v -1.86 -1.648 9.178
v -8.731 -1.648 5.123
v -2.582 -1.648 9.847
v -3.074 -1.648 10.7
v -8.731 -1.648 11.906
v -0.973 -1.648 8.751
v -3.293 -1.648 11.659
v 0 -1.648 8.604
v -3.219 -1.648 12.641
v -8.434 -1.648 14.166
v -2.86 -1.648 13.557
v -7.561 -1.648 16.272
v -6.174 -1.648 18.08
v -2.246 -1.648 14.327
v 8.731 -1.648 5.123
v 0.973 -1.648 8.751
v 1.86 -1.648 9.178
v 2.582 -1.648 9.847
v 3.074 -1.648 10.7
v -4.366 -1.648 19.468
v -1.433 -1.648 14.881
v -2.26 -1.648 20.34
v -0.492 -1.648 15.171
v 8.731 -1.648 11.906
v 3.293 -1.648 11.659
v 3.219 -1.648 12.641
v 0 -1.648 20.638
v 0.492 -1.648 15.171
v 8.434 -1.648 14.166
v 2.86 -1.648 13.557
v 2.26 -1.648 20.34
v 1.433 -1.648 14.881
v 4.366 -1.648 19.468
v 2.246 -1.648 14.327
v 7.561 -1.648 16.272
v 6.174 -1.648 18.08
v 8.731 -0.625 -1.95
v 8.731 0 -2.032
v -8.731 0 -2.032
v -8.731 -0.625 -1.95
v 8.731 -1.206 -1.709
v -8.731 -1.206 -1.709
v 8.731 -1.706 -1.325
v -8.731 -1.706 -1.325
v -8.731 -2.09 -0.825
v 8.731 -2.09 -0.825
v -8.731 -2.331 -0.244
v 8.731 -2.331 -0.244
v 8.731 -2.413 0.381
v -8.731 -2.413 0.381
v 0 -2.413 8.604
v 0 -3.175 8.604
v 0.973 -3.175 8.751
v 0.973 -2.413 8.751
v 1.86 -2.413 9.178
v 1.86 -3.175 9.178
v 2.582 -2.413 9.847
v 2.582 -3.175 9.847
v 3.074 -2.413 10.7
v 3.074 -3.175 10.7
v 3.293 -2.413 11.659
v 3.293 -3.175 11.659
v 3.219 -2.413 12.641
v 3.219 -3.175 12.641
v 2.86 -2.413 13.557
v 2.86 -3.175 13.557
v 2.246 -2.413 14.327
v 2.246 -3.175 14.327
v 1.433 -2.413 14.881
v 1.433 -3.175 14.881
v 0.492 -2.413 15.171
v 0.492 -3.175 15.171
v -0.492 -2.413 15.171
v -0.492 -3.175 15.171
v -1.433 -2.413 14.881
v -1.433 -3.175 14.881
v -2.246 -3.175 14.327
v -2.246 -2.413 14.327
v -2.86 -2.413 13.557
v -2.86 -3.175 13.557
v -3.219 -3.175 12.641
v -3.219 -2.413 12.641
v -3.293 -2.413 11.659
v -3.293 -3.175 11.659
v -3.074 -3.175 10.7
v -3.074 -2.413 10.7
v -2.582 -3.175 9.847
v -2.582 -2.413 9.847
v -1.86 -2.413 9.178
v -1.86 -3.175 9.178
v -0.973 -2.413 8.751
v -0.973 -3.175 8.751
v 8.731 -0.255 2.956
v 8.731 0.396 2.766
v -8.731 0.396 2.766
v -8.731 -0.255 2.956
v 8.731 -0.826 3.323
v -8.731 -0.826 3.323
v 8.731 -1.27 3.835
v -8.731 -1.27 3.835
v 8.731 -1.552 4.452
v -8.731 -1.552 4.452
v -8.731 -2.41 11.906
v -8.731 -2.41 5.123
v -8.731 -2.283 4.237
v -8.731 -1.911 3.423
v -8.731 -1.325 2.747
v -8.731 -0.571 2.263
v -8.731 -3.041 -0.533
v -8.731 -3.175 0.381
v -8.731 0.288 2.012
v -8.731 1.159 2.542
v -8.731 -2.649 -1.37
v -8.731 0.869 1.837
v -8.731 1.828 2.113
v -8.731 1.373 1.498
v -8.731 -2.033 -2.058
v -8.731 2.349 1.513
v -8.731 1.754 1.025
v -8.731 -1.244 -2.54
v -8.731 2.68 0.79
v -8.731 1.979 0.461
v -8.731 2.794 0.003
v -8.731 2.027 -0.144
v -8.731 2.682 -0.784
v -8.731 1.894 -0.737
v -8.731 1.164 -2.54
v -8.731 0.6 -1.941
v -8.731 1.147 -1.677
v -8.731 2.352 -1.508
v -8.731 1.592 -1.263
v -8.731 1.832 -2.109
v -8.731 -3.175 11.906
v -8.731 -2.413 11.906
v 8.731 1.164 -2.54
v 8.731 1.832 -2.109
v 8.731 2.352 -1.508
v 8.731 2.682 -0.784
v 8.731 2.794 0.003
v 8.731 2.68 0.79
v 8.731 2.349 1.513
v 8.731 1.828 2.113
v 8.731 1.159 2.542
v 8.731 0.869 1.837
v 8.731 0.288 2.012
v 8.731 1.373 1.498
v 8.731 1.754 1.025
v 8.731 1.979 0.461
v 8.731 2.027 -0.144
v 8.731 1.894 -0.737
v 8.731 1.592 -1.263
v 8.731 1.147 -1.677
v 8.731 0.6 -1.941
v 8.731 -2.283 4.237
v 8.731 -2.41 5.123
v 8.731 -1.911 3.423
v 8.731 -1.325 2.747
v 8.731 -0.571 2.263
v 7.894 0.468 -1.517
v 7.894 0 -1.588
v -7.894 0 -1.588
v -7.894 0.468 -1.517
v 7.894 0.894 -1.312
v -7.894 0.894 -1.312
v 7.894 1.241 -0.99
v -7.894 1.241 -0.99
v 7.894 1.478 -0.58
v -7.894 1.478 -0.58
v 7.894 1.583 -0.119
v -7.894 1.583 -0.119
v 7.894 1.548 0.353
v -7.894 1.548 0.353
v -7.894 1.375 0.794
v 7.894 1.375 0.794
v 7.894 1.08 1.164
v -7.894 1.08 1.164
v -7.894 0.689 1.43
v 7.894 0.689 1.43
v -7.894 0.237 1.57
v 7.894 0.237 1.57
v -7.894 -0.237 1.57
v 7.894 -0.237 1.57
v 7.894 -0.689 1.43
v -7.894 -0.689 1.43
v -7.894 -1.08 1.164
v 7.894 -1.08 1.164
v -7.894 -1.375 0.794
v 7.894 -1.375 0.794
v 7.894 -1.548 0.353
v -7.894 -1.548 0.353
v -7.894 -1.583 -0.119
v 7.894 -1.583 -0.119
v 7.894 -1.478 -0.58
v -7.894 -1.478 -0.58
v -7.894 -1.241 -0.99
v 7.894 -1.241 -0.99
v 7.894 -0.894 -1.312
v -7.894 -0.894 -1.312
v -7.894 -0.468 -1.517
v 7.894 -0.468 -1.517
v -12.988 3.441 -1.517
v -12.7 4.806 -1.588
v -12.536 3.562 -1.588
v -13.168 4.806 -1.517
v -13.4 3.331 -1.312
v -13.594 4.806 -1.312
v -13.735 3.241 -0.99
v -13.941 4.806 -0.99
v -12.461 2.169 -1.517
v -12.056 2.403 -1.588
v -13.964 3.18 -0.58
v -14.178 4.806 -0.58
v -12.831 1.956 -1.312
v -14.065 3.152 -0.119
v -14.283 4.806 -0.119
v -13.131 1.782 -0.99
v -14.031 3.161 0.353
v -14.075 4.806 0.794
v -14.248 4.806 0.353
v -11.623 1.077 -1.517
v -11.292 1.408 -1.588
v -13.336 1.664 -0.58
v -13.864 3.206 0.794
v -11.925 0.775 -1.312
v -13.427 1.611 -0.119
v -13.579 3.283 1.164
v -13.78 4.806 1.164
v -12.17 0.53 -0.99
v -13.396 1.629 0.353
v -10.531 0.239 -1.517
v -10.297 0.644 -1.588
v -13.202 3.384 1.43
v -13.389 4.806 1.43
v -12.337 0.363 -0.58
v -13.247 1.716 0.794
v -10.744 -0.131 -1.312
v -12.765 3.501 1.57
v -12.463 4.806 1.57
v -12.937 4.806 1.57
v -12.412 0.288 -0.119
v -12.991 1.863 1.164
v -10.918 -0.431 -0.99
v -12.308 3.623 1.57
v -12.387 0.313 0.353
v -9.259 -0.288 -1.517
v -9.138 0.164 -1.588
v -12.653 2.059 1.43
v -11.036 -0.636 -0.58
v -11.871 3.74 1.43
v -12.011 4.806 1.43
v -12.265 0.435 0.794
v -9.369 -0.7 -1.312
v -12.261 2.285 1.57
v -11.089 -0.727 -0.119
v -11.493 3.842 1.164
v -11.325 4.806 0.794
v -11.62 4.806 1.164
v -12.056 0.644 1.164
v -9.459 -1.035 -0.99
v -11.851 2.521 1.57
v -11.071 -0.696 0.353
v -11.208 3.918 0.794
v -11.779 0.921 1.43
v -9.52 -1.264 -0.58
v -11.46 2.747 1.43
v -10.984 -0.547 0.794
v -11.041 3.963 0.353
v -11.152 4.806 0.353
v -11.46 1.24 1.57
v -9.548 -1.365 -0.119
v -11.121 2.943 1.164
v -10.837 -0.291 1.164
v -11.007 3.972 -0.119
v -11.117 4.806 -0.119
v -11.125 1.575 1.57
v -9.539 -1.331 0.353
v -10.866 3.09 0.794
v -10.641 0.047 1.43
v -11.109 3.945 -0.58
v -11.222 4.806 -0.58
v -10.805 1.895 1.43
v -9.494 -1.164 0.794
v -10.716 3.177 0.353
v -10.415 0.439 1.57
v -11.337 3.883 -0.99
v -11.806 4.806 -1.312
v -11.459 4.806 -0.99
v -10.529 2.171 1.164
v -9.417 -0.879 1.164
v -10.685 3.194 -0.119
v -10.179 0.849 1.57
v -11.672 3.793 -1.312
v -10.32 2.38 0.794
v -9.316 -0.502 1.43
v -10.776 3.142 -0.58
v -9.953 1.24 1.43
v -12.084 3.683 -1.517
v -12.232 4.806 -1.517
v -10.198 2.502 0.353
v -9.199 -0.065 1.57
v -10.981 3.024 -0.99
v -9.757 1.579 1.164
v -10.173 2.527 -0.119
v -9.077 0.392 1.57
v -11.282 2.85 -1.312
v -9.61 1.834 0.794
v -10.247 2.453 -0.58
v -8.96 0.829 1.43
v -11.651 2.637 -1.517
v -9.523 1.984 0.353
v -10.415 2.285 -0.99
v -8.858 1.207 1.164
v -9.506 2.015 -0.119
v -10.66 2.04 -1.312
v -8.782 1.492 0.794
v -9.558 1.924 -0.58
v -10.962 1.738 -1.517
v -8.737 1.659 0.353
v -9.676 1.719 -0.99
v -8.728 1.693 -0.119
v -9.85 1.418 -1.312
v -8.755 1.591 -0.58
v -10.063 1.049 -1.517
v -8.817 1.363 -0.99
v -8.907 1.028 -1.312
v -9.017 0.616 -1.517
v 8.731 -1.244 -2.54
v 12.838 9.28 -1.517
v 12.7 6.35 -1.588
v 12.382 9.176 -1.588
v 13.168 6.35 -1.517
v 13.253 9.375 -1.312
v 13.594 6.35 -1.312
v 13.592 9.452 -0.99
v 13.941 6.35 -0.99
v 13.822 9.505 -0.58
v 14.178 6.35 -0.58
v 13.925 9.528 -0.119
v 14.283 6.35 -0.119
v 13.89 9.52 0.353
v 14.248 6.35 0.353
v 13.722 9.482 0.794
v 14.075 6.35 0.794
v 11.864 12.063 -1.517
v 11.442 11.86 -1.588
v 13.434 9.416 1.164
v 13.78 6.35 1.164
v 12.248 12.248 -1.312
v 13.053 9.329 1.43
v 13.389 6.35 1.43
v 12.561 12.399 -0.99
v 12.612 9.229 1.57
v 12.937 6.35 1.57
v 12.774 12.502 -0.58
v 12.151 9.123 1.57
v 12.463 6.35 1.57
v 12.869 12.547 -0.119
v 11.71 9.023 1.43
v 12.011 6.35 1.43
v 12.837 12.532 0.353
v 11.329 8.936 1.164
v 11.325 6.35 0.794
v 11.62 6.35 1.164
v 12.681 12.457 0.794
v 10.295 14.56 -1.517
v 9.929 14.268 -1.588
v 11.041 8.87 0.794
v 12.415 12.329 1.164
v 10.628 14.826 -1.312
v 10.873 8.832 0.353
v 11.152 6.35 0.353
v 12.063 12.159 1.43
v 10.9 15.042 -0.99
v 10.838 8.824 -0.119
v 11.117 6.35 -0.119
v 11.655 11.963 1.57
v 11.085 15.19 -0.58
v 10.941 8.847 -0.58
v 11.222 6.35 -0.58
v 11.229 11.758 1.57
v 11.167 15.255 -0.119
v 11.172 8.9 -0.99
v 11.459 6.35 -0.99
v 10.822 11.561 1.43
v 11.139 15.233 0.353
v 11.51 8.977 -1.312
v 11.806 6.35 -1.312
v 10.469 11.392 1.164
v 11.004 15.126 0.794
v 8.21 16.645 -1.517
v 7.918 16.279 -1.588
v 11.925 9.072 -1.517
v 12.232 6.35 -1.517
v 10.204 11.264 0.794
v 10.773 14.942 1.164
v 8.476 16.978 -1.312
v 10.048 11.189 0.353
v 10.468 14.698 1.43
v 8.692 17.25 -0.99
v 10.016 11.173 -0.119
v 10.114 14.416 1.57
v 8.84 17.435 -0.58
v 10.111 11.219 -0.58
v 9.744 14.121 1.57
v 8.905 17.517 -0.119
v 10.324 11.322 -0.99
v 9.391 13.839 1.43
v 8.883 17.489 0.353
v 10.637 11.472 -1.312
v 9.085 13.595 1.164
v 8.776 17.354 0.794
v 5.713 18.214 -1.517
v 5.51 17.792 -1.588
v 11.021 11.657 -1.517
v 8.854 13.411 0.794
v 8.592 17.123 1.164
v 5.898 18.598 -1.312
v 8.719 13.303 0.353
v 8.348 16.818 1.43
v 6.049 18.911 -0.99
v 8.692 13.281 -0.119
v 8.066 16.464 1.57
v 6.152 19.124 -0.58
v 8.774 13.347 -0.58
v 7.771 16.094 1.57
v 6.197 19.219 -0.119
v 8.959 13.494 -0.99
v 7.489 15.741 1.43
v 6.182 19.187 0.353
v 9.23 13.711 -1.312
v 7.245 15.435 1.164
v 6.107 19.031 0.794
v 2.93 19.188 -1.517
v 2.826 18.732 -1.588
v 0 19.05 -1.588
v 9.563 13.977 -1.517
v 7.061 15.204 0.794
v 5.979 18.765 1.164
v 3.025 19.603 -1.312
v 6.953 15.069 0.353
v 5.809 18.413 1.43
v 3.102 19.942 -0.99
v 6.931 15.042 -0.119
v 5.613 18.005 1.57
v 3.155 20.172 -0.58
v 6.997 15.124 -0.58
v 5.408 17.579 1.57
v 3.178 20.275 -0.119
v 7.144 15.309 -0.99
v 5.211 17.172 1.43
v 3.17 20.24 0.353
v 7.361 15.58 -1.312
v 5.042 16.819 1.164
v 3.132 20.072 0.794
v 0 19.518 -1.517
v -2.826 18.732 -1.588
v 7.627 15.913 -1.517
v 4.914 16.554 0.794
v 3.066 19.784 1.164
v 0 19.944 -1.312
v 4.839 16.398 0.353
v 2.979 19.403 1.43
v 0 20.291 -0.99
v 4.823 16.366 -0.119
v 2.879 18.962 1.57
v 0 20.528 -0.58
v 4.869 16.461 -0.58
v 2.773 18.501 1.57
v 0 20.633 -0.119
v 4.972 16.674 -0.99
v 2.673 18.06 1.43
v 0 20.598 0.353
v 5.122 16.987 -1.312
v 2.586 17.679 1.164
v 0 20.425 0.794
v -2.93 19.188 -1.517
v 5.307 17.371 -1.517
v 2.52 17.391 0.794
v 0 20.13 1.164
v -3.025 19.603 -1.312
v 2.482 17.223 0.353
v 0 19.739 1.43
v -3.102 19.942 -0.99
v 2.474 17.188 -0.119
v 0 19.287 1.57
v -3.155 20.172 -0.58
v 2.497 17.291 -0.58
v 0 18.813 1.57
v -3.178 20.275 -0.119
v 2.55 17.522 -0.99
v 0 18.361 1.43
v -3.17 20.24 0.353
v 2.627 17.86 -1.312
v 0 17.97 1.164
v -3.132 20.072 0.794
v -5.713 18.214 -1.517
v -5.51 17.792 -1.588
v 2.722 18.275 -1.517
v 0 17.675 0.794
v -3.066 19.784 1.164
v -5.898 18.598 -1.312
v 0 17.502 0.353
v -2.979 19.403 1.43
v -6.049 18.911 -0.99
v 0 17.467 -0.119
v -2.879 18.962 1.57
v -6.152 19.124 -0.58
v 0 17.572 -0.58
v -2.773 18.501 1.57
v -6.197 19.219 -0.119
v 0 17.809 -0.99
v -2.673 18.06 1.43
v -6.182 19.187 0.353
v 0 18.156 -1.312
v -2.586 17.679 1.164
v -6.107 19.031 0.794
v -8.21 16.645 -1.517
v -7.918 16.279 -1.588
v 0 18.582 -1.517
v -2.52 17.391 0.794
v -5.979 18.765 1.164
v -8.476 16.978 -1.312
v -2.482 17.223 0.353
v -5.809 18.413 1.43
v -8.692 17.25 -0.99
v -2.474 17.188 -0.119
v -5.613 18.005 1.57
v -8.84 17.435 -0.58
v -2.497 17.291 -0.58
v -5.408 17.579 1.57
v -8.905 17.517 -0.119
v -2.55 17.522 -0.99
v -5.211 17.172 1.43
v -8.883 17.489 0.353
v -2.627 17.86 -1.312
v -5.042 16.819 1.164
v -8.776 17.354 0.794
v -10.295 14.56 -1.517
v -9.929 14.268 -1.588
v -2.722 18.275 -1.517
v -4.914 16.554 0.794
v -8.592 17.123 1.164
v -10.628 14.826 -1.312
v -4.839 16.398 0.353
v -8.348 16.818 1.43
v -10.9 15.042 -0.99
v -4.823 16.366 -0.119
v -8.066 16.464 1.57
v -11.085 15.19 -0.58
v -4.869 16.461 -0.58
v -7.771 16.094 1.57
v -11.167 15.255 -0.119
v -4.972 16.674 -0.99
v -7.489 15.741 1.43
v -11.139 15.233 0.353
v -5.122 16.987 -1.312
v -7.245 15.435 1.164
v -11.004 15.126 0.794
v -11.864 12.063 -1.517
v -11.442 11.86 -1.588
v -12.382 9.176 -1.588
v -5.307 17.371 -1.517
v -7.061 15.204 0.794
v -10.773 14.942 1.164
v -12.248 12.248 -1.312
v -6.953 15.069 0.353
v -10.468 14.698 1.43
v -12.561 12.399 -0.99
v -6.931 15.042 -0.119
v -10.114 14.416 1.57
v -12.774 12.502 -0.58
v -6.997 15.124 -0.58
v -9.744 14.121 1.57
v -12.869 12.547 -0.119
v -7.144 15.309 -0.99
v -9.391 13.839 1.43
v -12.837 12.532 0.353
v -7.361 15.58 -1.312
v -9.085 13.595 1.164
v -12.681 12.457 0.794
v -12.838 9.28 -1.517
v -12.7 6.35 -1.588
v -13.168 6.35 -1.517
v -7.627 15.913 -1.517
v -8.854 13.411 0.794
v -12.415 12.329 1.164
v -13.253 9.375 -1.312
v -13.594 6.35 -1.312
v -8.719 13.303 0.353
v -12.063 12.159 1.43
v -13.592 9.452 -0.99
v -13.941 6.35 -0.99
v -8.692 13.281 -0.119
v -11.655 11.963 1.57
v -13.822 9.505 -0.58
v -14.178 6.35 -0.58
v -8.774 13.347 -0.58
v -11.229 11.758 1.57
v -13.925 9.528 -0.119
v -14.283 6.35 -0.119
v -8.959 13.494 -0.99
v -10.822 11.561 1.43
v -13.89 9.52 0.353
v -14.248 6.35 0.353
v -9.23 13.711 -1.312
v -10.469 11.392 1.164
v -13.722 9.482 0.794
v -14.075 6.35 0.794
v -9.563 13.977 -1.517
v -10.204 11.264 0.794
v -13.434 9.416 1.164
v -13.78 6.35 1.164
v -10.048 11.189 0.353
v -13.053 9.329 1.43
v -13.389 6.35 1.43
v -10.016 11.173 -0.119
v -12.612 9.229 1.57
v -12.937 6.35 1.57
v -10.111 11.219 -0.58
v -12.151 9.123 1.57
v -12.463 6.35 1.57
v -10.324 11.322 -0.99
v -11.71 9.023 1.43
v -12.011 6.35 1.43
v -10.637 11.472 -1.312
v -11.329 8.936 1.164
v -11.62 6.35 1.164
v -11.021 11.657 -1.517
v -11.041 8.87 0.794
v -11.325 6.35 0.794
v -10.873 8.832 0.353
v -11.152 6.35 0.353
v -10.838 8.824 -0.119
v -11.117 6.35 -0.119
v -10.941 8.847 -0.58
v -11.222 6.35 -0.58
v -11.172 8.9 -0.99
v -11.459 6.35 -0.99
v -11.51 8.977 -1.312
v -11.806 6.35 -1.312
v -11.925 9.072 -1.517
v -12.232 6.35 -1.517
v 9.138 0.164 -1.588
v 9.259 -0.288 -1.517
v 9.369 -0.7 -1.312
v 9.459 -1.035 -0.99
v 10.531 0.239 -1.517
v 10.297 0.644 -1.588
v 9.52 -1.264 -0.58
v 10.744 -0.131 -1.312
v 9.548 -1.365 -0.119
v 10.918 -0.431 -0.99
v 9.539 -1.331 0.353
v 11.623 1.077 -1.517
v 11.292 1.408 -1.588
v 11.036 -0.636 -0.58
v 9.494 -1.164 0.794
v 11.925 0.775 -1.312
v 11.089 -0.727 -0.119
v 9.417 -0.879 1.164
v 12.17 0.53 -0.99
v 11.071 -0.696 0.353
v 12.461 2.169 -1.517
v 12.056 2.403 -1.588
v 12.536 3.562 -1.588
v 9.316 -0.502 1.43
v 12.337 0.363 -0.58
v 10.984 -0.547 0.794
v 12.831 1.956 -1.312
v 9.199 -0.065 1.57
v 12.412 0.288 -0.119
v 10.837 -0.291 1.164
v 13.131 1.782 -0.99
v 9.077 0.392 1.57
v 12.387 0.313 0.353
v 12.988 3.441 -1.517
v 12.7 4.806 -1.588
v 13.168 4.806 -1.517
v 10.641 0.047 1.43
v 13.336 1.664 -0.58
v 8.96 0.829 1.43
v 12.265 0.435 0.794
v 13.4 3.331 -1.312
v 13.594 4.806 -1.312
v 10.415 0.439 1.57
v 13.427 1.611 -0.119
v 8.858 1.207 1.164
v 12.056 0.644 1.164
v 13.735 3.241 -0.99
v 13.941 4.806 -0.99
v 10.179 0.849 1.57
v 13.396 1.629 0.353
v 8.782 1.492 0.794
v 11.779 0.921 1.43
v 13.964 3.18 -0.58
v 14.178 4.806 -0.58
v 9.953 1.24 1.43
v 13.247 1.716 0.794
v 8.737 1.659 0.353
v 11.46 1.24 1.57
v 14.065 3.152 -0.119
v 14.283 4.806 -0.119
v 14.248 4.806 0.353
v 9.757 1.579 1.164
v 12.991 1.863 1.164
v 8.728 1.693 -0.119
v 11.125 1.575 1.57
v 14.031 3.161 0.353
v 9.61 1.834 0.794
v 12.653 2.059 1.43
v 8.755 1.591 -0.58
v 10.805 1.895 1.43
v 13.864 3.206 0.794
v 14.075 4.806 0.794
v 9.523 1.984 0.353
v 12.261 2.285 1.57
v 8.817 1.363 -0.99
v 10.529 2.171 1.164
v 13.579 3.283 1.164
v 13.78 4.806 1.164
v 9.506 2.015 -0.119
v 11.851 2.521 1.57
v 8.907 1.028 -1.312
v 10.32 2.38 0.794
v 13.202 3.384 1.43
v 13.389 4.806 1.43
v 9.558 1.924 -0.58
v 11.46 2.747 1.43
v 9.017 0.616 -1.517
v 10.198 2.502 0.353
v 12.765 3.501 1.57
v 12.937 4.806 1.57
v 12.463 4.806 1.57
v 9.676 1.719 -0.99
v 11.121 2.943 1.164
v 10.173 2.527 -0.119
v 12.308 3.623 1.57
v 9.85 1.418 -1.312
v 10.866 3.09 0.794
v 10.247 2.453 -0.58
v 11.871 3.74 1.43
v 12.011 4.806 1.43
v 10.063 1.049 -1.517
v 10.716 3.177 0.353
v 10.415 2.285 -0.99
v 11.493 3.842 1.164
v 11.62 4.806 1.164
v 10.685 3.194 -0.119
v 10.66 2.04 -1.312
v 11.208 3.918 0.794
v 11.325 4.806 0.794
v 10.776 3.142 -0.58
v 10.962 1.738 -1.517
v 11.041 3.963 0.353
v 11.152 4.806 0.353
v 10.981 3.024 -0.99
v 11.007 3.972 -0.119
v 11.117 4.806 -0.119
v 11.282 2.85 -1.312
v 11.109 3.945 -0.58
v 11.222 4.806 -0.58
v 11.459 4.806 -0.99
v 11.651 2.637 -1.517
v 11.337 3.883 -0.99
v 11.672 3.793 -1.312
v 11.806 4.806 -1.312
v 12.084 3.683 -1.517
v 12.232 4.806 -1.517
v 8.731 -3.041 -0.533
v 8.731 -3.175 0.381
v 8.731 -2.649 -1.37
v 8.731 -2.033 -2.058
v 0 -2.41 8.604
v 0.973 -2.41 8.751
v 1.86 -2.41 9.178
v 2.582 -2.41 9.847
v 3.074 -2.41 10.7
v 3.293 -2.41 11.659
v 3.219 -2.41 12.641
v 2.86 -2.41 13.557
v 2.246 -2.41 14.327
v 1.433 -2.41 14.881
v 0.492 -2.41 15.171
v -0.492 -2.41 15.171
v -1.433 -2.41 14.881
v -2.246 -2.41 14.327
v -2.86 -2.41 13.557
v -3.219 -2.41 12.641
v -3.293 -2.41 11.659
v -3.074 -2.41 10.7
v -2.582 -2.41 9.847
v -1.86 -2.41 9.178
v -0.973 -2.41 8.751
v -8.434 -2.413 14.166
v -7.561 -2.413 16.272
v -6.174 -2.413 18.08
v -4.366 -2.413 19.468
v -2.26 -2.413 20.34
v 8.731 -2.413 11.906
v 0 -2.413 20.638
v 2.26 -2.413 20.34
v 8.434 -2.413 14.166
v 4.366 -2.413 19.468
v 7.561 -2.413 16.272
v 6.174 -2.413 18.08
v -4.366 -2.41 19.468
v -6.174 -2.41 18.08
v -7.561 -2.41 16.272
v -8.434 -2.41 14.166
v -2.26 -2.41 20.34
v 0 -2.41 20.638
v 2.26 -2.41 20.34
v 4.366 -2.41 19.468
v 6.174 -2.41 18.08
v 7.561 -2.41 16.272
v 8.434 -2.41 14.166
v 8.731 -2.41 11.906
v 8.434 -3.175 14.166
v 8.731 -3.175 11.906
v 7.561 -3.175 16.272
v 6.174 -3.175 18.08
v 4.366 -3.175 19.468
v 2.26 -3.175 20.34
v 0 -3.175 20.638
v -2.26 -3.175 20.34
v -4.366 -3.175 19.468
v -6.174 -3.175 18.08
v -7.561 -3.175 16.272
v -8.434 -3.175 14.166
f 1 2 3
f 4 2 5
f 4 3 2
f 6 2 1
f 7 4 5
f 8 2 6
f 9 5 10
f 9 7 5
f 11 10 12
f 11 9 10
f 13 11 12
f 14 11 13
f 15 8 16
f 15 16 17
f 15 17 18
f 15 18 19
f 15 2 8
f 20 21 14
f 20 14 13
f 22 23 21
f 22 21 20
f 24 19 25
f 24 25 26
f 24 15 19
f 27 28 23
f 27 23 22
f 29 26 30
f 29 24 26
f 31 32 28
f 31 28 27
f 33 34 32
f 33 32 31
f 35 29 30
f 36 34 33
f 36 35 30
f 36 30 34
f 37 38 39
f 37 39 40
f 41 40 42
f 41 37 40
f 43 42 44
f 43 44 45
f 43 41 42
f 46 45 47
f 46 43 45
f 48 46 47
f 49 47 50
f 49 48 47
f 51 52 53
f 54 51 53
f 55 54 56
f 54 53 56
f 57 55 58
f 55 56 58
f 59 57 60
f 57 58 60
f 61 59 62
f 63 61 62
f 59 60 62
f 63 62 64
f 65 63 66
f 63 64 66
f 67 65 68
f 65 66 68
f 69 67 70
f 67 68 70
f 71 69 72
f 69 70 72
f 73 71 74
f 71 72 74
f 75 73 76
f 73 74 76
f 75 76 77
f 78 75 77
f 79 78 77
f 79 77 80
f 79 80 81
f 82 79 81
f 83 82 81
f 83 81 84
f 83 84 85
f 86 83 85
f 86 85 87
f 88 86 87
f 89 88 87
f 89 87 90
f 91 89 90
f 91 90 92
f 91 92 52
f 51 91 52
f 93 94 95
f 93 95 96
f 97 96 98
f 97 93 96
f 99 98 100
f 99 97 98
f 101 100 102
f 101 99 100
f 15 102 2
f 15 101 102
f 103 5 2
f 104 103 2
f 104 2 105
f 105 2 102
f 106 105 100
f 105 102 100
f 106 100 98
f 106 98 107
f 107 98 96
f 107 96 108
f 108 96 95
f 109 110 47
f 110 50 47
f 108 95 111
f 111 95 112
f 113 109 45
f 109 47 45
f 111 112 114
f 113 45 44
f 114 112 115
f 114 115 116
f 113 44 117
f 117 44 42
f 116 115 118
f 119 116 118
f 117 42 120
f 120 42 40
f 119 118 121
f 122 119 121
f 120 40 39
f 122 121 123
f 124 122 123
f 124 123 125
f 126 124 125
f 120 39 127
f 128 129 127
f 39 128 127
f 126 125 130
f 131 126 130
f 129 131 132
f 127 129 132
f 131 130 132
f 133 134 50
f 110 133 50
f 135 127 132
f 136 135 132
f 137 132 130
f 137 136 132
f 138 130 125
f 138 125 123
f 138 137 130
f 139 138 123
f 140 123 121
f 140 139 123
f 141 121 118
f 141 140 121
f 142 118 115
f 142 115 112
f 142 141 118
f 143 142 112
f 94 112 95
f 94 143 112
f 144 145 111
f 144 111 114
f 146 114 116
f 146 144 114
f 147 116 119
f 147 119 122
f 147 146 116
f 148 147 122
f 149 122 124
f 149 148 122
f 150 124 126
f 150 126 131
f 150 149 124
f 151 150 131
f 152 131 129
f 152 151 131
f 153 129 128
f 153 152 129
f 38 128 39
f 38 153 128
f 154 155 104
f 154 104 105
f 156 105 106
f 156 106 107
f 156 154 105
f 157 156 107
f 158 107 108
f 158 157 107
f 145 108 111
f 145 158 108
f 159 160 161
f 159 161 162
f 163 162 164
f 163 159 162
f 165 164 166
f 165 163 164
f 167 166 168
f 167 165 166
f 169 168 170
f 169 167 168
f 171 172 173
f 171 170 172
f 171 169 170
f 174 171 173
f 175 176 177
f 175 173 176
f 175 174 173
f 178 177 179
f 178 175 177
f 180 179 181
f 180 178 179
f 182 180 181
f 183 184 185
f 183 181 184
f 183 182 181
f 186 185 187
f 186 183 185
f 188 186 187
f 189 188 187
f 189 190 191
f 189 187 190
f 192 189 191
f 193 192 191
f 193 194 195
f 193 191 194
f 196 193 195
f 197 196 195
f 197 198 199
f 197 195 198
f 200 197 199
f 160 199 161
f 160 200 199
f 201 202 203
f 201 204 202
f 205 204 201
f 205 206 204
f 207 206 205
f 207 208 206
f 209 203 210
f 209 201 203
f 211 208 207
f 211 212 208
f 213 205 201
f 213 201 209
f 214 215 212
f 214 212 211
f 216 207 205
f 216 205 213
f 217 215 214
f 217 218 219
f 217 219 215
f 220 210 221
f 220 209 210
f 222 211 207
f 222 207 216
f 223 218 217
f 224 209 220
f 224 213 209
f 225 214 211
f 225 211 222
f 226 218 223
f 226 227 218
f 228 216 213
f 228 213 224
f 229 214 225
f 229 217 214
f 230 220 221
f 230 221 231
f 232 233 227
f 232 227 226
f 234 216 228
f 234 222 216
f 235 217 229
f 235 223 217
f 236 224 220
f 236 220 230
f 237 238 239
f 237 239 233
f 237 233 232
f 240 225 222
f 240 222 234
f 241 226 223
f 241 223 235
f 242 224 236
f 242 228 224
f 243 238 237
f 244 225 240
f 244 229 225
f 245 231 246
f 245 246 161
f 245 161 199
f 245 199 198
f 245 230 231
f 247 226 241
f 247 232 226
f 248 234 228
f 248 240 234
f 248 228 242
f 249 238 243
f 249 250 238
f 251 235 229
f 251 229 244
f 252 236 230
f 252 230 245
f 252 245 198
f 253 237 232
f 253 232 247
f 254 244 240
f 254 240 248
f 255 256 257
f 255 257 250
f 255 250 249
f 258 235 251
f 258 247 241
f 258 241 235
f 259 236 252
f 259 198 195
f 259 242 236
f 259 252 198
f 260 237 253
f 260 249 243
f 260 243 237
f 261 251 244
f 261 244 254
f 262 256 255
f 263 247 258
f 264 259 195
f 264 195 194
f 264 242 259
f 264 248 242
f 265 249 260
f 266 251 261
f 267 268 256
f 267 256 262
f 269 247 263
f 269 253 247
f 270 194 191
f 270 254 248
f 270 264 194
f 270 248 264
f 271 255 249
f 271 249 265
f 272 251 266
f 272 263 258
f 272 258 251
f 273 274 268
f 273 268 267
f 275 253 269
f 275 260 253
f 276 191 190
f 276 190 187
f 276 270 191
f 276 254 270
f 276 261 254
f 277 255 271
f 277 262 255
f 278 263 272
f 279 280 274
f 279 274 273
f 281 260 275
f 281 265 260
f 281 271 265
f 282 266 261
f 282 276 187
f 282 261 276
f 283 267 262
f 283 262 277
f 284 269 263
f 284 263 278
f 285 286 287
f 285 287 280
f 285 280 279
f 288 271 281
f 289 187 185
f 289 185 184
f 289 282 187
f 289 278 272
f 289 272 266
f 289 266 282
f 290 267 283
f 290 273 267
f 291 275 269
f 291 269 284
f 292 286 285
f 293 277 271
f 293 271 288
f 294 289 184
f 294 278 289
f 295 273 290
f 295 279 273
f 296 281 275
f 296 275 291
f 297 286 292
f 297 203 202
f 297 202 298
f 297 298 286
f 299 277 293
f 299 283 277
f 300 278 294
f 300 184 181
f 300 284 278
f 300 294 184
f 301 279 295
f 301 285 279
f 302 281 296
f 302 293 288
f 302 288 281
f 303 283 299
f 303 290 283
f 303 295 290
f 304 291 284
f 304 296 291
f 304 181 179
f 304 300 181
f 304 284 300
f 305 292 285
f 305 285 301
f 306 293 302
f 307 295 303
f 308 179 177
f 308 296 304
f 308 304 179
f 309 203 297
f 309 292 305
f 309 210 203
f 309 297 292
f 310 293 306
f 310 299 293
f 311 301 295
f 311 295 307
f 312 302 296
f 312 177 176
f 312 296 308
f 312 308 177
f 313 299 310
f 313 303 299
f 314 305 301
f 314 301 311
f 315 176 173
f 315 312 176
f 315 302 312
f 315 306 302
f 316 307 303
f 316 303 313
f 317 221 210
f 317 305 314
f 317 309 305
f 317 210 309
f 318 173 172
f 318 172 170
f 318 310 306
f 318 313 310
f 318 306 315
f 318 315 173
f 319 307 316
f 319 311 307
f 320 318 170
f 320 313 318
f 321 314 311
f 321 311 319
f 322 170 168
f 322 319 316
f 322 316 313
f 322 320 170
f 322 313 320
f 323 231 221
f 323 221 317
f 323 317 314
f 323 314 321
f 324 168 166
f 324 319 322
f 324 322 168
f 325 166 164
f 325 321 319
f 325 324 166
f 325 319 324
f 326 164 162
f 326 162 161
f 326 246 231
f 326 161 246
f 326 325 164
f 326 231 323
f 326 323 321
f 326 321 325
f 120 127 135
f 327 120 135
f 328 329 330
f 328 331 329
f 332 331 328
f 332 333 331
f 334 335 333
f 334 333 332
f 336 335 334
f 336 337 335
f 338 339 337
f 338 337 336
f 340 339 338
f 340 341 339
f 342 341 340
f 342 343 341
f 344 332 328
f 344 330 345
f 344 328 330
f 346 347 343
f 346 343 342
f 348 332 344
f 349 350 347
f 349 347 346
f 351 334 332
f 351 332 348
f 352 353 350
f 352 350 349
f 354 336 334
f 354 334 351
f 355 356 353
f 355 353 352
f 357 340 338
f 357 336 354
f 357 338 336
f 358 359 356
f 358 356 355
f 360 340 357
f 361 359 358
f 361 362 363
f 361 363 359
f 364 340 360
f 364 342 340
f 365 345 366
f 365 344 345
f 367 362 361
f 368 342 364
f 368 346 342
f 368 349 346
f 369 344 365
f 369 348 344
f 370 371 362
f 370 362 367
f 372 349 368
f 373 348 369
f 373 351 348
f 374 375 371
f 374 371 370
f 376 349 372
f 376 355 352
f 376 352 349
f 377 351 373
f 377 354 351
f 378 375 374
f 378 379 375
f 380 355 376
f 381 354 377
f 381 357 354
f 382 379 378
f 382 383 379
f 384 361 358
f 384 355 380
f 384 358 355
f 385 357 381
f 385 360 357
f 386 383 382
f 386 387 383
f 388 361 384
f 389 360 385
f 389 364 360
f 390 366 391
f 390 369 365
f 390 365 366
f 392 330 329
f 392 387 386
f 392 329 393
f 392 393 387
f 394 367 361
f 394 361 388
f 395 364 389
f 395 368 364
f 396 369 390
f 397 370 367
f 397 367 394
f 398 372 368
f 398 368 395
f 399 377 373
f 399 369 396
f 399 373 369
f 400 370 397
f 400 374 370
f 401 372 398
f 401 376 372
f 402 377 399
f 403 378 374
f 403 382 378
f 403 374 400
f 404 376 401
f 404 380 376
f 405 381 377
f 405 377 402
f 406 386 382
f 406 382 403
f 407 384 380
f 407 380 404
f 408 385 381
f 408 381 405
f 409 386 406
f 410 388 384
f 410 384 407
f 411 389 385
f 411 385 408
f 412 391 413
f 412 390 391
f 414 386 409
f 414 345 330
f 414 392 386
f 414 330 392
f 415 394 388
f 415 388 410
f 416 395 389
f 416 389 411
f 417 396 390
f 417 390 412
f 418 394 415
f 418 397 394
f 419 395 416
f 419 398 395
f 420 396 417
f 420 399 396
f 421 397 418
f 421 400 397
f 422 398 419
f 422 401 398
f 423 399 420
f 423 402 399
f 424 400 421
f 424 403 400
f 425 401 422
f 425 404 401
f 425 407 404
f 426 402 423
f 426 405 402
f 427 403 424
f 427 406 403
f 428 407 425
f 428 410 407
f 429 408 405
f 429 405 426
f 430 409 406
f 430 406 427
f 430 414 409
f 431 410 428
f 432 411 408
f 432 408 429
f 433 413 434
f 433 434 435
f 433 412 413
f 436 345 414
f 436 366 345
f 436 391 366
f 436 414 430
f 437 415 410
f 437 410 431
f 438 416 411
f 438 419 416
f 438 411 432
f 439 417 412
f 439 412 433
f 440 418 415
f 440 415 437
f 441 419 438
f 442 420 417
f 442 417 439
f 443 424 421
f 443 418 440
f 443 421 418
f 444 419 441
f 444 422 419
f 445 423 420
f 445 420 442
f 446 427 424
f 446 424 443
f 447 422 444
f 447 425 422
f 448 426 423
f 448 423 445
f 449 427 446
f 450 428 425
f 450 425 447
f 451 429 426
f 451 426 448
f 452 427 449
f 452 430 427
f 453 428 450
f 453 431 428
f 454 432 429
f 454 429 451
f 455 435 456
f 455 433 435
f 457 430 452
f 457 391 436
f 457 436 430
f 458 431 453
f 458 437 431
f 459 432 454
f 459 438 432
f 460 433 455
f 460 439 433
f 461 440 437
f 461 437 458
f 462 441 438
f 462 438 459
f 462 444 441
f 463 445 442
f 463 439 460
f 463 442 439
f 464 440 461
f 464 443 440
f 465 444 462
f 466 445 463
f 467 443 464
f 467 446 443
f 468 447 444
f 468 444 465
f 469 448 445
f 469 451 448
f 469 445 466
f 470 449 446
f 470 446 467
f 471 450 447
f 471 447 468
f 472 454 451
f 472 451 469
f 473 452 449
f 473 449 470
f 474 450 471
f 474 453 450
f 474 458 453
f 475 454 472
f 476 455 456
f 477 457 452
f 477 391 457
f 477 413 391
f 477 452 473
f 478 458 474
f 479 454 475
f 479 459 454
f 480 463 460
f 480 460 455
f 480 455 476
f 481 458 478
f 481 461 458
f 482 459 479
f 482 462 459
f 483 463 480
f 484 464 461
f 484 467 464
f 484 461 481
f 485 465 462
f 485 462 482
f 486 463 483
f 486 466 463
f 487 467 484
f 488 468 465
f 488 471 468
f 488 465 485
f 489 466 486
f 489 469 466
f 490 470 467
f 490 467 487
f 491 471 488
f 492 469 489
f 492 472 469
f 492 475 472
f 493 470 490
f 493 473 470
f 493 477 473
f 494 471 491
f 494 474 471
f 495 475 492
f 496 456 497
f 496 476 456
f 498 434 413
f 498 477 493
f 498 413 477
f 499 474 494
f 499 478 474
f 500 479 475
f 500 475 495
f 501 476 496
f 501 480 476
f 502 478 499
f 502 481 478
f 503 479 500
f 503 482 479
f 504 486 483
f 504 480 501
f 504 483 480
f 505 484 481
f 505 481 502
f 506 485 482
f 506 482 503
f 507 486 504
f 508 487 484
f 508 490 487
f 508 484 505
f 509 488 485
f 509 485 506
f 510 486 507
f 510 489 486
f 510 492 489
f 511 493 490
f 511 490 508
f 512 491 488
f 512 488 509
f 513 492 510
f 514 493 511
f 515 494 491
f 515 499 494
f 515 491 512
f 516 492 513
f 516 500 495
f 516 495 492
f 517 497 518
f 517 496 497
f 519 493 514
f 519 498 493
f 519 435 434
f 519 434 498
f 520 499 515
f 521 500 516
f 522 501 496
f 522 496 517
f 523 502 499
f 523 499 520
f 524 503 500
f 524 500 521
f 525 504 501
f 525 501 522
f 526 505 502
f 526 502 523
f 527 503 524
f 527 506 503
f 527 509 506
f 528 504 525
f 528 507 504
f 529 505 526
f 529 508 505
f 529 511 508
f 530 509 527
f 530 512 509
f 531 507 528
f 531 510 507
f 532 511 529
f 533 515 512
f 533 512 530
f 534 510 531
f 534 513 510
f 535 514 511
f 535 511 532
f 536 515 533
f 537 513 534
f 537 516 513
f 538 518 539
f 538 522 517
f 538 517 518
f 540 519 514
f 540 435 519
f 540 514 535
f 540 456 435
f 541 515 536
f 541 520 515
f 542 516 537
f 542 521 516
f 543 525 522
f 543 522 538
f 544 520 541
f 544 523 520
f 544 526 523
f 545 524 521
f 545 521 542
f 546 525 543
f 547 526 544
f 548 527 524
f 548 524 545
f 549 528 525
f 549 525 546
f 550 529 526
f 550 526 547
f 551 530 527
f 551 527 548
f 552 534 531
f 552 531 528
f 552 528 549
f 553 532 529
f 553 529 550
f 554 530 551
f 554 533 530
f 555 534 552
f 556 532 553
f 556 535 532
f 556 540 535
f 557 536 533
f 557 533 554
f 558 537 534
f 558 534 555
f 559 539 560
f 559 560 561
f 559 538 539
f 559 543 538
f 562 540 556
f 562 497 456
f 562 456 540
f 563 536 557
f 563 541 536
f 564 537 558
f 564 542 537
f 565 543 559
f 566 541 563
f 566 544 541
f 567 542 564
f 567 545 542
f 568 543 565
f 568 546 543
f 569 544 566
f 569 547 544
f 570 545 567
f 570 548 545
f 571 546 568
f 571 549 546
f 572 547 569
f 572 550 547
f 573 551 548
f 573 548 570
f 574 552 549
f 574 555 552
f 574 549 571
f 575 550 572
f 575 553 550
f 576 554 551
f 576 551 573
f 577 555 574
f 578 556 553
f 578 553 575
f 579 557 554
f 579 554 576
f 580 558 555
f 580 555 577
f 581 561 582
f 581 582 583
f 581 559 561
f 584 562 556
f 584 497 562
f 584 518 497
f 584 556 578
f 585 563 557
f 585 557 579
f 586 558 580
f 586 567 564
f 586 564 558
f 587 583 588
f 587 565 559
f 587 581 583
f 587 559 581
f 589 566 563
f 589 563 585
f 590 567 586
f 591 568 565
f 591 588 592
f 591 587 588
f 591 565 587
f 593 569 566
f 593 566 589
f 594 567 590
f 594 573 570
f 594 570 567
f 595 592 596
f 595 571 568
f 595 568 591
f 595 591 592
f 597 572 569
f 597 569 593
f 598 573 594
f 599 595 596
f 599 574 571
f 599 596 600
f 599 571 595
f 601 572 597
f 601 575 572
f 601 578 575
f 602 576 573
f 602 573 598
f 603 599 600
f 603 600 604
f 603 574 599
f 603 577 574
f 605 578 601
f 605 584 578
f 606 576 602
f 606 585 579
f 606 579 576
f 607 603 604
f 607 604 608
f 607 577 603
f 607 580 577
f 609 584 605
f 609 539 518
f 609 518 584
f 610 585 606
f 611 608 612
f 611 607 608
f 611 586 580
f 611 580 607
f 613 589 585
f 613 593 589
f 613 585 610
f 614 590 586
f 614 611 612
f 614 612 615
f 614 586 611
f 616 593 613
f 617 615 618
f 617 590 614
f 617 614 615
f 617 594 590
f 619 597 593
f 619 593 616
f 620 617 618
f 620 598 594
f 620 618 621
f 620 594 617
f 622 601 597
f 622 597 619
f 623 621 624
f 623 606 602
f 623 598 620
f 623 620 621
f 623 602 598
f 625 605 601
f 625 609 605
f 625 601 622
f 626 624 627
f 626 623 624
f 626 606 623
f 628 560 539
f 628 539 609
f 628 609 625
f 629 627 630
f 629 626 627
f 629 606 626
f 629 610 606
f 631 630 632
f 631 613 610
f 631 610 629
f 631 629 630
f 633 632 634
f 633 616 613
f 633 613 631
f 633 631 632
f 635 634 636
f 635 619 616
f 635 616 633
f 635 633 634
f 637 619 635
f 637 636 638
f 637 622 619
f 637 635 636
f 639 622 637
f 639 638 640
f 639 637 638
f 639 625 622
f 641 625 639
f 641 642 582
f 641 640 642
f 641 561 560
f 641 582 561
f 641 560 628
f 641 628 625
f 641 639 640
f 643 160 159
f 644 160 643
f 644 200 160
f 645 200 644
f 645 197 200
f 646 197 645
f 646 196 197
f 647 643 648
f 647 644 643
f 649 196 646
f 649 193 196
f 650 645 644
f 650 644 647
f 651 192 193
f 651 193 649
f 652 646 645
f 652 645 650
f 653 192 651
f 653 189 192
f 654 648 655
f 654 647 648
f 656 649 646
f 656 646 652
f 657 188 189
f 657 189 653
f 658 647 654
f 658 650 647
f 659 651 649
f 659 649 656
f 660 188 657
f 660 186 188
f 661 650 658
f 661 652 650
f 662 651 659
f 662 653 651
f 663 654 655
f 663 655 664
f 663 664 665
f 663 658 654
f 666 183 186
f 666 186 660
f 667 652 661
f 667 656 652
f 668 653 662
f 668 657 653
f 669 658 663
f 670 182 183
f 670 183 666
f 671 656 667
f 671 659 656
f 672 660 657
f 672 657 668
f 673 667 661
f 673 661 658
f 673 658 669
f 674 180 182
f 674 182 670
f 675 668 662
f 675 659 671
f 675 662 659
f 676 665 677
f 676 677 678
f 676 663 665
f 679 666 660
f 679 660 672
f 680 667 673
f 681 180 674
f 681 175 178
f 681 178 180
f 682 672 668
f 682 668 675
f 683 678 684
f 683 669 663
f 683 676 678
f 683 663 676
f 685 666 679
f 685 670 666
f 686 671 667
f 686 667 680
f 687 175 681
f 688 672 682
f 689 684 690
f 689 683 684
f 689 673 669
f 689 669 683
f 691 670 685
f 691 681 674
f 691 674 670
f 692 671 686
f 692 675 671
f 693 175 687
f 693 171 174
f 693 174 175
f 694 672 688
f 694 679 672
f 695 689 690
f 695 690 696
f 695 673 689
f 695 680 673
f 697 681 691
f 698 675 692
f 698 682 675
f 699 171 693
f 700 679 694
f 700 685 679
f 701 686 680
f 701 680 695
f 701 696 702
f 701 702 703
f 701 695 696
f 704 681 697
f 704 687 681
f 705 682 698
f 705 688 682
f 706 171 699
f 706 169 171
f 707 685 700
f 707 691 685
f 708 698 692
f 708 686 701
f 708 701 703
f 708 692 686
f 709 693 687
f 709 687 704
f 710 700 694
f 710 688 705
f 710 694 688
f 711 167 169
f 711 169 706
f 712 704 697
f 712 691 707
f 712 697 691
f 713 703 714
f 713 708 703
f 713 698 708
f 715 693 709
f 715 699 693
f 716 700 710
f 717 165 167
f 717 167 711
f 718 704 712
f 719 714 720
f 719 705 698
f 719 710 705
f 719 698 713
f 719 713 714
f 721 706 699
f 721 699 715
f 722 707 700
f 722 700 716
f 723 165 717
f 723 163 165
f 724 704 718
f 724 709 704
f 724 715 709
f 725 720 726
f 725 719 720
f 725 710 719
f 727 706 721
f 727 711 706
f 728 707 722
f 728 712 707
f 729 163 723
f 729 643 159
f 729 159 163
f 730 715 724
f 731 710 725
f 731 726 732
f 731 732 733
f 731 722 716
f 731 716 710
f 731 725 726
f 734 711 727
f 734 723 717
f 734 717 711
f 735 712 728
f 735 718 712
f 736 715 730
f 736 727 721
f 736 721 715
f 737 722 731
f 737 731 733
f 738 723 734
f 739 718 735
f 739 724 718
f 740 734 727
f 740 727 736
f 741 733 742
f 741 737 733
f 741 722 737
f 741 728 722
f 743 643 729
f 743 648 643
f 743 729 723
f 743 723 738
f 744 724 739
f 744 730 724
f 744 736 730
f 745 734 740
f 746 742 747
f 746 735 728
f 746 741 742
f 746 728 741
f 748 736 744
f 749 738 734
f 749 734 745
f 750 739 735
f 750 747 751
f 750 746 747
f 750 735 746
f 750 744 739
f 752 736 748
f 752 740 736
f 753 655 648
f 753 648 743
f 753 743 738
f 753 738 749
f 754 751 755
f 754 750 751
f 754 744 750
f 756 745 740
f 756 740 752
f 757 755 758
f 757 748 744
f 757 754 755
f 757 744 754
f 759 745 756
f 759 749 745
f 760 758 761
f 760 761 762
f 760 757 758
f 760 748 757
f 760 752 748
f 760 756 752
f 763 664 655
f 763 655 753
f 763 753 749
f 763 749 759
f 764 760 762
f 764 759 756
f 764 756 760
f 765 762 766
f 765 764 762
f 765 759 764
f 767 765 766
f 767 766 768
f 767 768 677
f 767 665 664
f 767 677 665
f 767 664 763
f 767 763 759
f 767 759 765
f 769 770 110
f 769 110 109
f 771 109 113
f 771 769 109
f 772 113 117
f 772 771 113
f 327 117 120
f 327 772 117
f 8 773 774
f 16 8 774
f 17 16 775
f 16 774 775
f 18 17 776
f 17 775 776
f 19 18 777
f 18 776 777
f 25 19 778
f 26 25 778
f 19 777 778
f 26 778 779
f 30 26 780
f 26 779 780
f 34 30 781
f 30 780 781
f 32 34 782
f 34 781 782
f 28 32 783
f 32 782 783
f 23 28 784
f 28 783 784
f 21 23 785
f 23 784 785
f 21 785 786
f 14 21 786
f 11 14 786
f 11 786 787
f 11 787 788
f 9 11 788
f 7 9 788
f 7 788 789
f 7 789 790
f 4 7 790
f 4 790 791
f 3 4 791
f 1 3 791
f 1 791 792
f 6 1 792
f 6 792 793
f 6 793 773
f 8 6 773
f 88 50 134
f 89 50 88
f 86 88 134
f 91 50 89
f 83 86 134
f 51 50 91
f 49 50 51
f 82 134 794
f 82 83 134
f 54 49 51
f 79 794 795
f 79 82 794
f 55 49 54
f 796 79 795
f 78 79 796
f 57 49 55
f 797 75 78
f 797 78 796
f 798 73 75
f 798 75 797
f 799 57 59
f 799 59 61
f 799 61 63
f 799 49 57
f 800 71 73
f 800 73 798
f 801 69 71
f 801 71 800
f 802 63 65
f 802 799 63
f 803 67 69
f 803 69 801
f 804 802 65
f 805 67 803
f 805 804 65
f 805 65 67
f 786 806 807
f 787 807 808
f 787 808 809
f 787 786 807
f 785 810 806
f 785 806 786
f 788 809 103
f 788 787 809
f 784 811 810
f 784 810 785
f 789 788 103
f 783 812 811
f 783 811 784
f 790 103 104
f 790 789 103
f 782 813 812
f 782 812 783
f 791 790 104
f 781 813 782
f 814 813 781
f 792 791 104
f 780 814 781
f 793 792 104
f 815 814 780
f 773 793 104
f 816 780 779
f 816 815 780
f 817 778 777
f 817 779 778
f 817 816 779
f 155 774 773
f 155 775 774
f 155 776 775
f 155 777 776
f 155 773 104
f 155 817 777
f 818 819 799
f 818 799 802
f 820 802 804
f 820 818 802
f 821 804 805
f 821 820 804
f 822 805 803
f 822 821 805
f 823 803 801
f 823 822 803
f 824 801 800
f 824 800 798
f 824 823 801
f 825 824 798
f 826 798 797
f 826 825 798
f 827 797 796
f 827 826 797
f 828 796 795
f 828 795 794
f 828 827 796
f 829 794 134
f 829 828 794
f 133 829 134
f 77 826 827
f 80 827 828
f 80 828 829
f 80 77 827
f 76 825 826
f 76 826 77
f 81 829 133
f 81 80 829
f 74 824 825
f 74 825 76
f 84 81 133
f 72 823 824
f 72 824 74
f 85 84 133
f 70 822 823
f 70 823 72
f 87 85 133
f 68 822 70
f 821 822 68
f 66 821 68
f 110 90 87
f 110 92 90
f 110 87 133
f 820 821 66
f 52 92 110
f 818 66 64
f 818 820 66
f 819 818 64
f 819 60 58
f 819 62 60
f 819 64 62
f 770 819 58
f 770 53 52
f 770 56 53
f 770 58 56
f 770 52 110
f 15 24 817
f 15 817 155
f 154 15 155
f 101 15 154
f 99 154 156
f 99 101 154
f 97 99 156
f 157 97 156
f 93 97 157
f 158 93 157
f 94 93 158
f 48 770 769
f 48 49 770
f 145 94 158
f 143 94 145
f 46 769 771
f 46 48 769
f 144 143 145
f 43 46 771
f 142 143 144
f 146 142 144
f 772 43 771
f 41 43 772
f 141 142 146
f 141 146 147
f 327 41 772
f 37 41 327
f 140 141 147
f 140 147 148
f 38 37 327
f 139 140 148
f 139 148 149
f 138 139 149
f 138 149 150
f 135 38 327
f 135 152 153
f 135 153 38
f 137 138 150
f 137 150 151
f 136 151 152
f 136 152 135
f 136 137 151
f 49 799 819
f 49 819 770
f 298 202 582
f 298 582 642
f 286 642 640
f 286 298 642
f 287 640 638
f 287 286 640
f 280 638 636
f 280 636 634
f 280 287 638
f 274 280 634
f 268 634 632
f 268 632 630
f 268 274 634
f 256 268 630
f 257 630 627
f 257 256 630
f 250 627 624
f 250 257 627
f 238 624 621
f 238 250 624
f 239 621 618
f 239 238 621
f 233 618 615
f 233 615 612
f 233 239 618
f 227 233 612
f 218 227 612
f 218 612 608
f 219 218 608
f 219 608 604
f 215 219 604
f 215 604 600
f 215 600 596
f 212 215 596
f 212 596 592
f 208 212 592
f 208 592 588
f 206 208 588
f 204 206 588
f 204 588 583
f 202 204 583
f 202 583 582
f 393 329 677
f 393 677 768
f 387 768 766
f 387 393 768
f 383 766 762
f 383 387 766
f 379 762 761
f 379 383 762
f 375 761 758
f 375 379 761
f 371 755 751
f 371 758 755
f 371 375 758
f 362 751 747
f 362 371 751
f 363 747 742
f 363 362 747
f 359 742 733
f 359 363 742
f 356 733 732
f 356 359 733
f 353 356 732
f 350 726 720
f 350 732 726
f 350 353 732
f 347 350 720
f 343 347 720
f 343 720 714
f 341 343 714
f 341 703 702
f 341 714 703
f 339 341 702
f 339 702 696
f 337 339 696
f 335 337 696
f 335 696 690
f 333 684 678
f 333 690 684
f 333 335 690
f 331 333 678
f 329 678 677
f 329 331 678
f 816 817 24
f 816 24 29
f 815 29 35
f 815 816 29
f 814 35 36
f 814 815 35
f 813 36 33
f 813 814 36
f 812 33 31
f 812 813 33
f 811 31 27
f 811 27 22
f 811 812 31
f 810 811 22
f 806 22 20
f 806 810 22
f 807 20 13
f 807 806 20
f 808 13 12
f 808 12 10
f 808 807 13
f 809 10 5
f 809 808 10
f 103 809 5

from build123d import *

# Parameters (mm, degrees)
SKETCH2_R           = 1.5875
BOSS_EXTRUDE1_DEPTH = 8.73125
SKETCH4_R           = 3.302
CUT_EXTRUDE1_DEPTH  = 35.598760474
CUT_EXTRUDE2_START  = -2.54
SKETCH5_W           = 19.108331581
SKETCH5_H           = 4.40731651
CUT_EXTRUDE2_DEPTH  = 2.54


with BuildPart() as part:
    # Sweep1: sweep along a path in Sketch1
    with BuildLine(Plane.XY) as sweep1_path:
        Line((-12.7, 6.35), (-12.7, 4.805901242))
        ThreePointArc((-12.7, 4.805901242), (-11.292384116, 1.407615884), (-7.894098758, 0))
        Line((-7.894098758, 0), (7.894098758, 0))
        ThreePointArc((7.894098758, 0), (11.292384116, 1.407615884), (12.7, 4.805901242))
        Line((12.7, 4.805901242), (12.7, 6.35))
        ThreePointArc((12.7, 6.35), (0, 19.05), (-12.7, 6.35))
    # Sketch2 → Sweep1 (sweep)
    with BuildSketch(Plane(origin=(0, 0, 0), x_dir=(0, 0, -1), z_dir=(1, 0, 0))):
        Circle(SKETCH2_R)
    sweep(path=sweep1_path.line)


with BuildPart() as body_2:
    # Sketch3 → Boss-Extrude1 (new, symmetric)
    with BuildSketch(Plane(origin=(0, 0, 0), x_dir=(0, 0, -1), z_dir=(1, 0, 0))):
        with BuildLine():
            Line((-20.6375, -3.175), (-0.381, -3.175))
            ThreePointArc((-0.381, -3.175), (1.86406403, -2.24506403), (2.794, 0))
            ThreePointArc((2.794, 0), (0.198308481, 2.786953488), (-2.765849496, 0.395616687))
            ThreePointArc((-2.765849496, 0.395616687), (-3.563066307, -1.066271632), (-5.12310759, -1.64846))
            Line((-5.12310759, -1.64846), (-20.6375, -1.64846))
            Line((-20.6375, -1.64846), (-20.6375, -2.41046))
            Line((-20.6375, -2.41046), (-5.12310759, -2.41046))
            ThreePointArc((-5.12310759, -2.41046), (-3.063853096, -1.641971355), (-2.011526906, 0.287721227))
            ThreePointArc((-2.011526906, 0.287721227), (0.14422435, 2.026875264), (2.032, 0))
            ThreePointArc((2.032, 0), (1.325248663, -1.706248663), (-0.381, -2.413))
            Line((-0.381, -2.413), (-20.6375, -2.413))
            Line((-20.6375, -2.413), (-20.6375, -3.175))
        make_face()
    extrude(amount=BOSS_EXTRUDE1_DEPTH, both=True)

    # Sketch4 → Cut-Extrude1 (cut, through all)
    with BuildSketch(Plane.XZ.offset(3.175)):
        with Locations(Location((0, 11.90625, 0), (0, 0, 270))):
            Circle(SKETCH4_R)
        with BuildLine():
            Line((-8.73125, 11.90625), (-8.73125, 20.6375))
            Line((-8.73125, 20.6375), (-8.73125, 21.9075))
            Line((-8.73125, 21.9075), (8.73125, 21.9075))
            Line((8.73125, 21.9075), (8.73125, 20.6375))
            Line((8.73125, 20.6375), (8.73125, 11.90625))
            ThreePointArc((8.73125, 11.90625), (0, 20.6375), (-8.73125, 11.90625))
        make_face()
    extrude(amount=-CUT_EXTRUDE1_DEPTH, mode=Mode.SUBTRACT)

    # Sketch5 → Cut-Extrude2 (cut)
    with BuildSketch(Plane.XY.offset(CUT_EXTRUDE2_START)):
        with Locations((-0.530371987, -0.038562852)):
            Rectangle(SKETCH5_W, SKETCH5_H)
    extrude(amount=-CUT_EXTRUDE2_DEPTH, mode=Mode.SUBTRACT)


solid = Compound([part.part, body_2.part])
